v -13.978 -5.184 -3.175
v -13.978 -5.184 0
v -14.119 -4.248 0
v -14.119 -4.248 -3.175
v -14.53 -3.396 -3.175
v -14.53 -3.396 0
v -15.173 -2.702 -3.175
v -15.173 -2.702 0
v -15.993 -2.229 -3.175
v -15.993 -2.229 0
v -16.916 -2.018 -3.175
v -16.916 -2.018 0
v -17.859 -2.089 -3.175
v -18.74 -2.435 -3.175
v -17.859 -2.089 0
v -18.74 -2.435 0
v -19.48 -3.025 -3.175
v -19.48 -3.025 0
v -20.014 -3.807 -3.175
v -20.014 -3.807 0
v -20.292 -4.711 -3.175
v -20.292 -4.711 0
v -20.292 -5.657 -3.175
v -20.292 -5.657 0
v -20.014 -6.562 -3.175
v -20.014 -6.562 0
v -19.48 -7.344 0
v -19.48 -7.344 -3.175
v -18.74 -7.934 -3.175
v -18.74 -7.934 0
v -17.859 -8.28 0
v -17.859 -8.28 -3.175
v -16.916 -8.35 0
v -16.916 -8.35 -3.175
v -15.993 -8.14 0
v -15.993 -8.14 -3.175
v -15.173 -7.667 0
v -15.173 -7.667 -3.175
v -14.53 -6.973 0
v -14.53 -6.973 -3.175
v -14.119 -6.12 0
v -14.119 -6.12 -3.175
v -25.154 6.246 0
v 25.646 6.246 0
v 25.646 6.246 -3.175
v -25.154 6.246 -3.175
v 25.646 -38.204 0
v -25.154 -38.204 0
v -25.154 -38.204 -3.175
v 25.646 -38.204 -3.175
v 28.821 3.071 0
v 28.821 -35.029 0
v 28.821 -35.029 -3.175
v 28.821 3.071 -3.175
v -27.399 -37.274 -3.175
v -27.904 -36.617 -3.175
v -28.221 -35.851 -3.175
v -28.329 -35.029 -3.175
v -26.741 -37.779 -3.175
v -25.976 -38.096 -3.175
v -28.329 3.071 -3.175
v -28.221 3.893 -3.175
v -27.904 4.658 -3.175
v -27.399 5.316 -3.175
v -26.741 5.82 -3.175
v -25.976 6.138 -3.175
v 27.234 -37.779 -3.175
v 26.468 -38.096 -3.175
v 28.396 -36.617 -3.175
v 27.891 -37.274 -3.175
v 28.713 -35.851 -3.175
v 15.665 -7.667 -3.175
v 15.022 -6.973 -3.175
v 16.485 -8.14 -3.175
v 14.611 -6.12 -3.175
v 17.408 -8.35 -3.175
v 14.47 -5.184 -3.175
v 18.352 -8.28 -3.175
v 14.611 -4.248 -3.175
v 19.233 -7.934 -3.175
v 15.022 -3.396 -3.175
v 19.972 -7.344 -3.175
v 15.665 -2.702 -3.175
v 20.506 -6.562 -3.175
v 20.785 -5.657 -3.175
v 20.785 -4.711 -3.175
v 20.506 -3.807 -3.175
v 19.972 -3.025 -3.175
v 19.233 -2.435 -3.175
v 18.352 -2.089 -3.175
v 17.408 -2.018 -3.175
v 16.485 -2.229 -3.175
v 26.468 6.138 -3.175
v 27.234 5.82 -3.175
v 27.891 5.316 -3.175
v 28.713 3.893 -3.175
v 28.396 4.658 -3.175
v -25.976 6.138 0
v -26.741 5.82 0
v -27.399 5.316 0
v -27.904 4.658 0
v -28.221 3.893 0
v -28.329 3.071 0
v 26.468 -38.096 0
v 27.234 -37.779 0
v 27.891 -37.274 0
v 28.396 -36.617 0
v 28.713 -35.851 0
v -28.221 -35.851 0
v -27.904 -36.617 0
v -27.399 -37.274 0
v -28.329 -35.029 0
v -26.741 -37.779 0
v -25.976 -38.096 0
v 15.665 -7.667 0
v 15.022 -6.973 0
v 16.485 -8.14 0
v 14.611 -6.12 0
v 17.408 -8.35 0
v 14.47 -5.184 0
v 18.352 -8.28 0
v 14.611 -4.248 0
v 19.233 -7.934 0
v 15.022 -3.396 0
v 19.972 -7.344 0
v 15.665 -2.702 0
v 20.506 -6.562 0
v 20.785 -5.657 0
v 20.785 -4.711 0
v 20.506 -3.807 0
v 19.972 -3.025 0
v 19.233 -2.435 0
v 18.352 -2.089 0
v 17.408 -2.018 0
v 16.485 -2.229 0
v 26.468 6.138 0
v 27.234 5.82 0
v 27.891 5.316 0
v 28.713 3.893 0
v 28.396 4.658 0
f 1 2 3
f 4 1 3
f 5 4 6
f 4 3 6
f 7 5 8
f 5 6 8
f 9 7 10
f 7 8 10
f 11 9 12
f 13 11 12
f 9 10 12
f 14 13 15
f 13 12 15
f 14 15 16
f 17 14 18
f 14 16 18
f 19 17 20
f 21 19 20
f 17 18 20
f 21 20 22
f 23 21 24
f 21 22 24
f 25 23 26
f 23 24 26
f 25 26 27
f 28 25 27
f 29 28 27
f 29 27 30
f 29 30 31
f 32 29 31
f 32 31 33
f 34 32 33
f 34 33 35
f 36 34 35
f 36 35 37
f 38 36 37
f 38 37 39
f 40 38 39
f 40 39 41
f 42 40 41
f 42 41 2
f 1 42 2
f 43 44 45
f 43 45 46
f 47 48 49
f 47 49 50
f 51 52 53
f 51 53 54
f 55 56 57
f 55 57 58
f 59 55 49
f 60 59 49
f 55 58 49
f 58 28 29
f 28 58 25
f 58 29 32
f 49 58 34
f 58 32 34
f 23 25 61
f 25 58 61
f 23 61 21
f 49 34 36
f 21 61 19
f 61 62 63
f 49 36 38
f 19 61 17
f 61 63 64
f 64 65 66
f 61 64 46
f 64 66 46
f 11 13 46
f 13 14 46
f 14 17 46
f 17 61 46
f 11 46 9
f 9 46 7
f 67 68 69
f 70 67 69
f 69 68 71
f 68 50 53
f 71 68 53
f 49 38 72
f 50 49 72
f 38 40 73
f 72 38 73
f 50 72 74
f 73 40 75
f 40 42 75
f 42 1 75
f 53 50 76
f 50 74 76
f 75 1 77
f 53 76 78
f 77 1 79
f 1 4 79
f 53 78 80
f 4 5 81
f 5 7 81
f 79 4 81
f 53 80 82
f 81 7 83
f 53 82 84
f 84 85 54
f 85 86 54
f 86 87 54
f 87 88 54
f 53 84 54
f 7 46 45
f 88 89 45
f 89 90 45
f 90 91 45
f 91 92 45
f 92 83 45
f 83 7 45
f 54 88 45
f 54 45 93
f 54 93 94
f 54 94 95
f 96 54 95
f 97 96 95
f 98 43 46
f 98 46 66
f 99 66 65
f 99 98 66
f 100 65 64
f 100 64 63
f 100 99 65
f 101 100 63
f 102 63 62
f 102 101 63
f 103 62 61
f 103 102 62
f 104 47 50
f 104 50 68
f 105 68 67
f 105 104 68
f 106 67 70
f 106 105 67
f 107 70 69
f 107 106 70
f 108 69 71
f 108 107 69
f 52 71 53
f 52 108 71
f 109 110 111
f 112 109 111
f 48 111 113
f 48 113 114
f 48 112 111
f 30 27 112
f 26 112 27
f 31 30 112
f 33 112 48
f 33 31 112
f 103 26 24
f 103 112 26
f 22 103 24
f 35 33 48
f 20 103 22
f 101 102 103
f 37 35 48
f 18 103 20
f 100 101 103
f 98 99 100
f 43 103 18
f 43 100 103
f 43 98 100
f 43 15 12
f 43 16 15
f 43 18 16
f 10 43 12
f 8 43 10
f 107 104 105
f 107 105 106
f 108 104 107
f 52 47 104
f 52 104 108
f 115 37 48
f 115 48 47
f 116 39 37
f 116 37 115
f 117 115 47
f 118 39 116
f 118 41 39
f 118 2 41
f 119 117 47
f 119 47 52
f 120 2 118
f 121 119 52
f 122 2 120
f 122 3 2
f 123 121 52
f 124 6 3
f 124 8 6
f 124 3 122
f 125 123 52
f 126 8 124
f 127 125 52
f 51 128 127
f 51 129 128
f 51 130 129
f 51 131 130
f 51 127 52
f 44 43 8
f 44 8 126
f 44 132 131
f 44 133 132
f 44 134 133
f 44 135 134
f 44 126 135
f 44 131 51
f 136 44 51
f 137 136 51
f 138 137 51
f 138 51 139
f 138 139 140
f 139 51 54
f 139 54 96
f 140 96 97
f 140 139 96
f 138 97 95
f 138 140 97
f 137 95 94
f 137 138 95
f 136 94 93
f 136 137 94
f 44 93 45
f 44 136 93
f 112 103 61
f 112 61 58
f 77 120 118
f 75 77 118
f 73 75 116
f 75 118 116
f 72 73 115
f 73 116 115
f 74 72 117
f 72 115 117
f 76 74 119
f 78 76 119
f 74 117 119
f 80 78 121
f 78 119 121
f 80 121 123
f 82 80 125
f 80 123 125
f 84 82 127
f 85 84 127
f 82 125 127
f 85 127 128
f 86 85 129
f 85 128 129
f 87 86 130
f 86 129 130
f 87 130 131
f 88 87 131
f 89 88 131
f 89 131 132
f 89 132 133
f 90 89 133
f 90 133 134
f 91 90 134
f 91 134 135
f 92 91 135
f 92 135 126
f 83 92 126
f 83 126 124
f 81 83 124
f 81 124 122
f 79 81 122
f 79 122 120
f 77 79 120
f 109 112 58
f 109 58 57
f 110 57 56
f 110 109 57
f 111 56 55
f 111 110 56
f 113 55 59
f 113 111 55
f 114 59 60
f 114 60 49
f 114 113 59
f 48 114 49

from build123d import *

# Parameters (mm, degrees)
BOSS_EXTRUDE1_DEPTH = 3.175
SKETCH2_R           = 3.175
CUT_EXTRUDE1_DEPTH  = 48.961405128


with BuildPart() as part:
    # Sketch1 → Boss-Extrude1 (new body)
    with BuildSketch(Plane.XY):
        with BuildLine():
            Line((-28.328951223, 3.070773738), (-28.328951223, -35.029226262))
            ThreePointArc((-28.328951223, -35.029226262), (-27.399015253, -37.274290292), (-25.153951223, -38.204226262))
            Line((-25.153951223, -38.204226262), (25.646048777, -38.204226262))
            ThreePointArc((25.646048777, -38.204226262), (27.891112807, -37.274290292), (28.821048777, -35.029226262))
            Line((28.821048777, -35.029226262), (28.821048777, 3.070773738))
            ThreePointArc((28.821048777, 3.070773738), (27.891112807, 5.315837768), (25.646048777, 6.245773738))
            Line((25.646048777, 6.245773738), (-25.153951223, 6.245773738))
            ThreePointArc((-25.153951223, 6.245773738), (-27.399015253, 5.315837768), (-28.328951223, 3.070773738))
        make_face()
    extrude(amount=-BOSS_EXTRUDE1_DEPTH)

    # Sketch2 → Cut-Extrude1 (cut, through all)
    with BuildSketch(Plane.XY):
        with Locations((-17.152951223, -5.184226262)):
            Circle(SKETCH2_R)
        with Locations(Location((17.645048777, -5.184226262, 0), (0, 0, 180))):
            Circle(SKETCH2_R)
    extrude(amount=-CUT_EXTRUDE1_DEPTH, mode=Mode.SUBTRACT)


solid = part.part
